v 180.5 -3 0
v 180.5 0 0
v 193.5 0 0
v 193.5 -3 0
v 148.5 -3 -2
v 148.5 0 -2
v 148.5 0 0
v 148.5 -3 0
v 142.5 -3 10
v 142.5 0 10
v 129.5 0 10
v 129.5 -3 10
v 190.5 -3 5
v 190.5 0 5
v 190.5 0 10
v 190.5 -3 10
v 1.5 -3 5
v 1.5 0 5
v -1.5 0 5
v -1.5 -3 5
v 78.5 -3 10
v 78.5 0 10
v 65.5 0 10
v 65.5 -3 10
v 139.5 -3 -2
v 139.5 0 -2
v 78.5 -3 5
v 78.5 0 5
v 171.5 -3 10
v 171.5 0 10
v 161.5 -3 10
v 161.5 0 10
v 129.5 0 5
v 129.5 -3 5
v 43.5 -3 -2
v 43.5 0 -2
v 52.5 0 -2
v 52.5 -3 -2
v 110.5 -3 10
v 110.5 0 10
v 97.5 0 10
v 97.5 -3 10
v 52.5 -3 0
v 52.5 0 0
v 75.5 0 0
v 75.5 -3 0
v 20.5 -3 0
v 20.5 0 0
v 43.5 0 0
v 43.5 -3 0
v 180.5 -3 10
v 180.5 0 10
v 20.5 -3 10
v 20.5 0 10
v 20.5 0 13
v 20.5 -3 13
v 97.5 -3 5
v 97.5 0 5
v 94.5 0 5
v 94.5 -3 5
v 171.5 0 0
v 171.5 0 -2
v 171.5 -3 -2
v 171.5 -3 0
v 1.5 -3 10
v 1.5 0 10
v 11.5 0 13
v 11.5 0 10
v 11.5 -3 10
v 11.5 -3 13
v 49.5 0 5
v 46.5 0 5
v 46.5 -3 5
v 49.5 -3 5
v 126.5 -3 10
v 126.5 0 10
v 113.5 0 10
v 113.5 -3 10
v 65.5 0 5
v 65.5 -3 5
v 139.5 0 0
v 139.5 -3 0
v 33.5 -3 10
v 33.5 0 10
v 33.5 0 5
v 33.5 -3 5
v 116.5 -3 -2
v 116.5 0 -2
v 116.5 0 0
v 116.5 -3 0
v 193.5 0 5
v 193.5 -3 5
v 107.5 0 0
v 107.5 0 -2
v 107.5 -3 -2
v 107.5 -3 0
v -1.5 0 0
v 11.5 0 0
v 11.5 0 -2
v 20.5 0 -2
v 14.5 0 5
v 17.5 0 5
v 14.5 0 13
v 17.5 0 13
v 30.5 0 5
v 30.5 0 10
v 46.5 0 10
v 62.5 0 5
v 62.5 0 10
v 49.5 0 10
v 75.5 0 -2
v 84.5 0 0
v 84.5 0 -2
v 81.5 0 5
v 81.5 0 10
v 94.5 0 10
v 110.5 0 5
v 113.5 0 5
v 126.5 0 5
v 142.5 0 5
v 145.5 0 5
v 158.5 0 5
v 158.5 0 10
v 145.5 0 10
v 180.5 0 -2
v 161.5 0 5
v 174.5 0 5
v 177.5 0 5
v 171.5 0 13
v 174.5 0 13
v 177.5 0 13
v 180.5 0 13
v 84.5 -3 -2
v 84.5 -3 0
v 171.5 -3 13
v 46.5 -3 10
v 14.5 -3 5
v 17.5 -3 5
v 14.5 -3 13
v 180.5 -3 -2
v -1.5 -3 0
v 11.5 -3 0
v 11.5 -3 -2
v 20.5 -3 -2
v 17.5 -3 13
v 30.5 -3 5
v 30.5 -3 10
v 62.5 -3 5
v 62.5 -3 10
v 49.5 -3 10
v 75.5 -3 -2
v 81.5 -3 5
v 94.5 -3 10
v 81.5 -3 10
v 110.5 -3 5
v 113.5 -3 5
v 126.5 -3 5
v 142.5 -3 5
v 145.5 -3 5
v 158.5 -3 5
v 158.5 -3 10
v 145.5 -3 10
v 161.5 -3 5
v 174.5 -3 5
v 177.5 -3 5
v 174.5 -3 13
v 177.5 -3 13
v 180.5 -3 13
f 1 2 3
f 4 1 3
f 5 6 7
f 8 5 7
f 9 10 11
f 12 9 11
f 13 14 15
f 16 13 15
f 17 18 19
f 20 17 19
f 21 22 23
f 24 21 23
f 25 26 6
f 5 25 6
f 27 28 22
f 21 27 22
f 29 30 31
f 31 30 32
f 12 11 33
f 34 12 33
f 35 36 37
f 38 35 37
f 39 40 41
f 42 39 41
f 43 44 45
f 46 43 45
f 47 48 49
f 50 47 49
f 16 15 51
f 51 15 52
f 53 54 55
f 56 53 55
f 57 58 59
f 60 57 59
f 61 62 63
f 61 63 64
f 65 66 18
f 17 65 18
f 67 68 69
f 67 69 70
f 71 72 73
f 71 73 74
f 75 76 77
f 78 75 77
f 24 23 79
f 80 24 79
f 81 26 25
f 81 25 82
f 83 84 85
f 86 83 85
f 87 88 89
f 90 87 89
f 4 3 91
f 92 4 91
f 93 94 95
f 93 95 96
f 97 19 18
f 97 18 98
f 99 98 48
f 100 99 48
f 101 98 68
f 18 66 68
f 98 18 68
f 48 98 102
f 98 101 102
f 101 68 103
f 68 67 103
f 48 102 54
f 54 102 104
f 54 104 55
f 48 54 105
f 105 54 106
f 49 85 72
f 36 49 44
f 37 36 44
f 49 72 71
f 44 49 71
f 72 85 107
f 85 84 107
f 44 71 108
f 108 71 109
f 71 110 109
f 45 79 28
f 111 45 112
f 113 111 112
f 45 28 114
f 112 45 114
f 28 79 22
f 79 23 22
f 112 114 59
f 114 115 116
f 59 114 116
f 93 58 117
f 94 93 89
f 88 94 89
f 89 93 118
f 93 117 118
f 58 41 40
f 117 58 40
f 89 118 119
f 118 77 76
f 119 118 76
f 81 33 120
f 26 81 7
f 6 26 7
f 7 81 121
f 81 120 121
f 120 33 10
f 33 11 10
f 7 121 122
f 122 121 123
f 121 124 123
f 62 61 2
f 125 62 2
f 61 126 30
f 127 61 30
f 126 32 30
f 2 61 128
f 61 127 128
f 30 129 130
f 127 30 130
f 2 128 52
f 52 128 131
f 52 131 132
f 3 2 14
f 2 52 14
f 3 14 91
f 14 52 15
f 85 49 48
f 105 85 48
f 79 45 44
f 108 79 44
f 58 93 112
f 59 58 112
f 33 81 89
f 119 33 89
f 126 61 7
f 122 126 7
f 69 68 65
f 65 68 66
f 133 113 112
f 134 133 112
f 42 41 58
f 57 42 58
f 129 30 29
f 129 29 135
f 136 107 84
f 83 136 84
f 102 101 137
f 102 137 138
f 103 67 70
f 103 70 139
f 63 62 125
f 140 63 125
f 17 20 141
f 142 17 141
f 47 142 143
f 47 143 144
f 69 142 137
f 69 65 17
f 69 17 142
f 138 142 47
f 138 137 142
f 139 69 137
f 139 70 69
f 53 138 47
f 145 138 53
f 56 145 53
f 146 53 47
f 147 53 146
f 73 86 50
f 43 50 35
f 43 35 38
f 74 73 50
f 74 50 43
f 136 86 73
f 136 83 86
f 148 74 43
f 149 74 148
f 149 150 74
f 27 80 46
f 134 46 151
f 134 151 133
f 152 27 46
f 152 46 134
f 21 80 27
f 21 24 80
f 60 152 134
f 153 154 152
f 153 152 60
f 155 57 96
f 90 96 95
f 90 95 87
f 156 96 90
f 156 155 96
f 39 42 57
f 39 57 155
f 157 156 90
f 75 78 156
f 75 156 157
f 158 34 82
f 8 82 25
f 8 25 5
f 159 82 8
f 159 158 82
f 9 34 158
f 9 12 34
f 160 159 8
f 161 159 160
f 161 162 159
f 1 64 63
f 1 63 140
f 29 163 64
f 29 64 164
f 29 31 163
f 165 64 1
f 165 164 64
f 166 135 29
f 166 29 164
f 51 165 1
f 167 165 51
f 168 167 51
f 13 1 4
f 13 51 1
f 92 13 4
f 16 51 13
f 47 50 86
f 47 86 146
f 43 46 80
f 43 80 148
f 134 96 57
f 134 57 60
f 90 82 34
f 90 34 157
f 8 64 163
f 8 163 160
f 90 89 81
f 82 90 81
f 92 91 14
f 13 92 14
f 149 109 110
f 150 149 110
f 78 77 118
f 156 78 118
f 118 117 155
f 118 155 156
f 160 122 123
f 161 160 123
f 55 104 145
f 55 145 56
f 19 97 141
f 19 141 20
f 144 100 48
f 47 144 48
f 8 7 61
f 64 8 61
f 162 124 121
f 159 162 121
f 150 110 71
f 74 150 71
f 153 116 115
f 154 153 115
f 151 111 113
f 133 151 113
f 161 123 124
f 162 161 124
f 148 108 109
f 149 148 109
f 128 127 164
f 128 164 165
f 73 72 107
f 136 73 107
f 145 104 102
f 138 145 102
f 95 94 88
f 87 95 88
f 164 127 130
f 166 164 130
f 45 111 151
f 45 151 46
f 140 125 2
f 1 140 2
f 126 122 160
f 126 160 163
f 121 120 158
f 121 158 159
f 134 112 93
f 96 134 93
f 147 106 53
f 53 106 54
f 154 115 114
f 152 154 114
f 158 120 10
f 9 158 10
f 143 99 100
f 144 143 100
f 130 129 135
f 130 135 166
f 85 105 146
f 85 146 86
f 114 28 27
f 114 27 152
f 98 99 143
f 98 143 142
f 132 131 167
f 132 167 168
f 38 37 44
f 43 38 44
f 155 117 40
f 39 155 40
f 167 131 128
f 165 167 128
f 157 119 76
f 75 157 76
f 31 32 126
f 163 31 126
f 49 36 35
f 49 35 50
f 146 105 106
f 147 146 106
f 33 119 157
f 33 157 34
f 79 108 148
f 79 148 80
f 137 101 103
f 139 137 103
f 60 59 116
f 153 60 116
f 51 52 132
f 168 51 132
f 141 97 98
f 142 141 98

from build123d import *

# Parameters (mm, degrees)
F0_W     = 1.5
F0_H     = 5
F0_W_2   = 3
F0_H_2   = 2
F0_H_3   = 3
F1_DEPTH = 3


# Not quite as in the source:
# - a feature names something its author has since deleted; it is built from what else it names


with BuildPart() as f1:
    # F0 (on Front) → F1 (new body)
    with BuildSketch(Plane.XZ):
        with Locations((0.75, 2.5)):
            Rectangle(F0_W, F0_H)
        with Locations((-0.75, 2.5)):
            Rectangle(F0_W, F0_H)
        Polygon((1.5, 5), (1.5, 0), (11.5, 0), (14.5, 0), (14.5, 5), (14.5, 10), (11.5, 10), (1.5, 10), align=None)
        with Locations((13, -1)):
            Rectangle(F0_W_2, F0_H_2)
        with Locations((16, -1)):
            Rectangle(F0_W_2, F0_H_2)
        with Locations((16, 2.5)):
            Rectangle(F0_W_2, F0_H)
        with Locations((19, -1)):
            Rectangle(F0_W_2, F0_H_2)
        Polygon((17.5, 5), (17.5, 0), (20.5, 0), (30.5, 0), (30.5, 5), (30.5, 10), (20.5, 10), (17.5, 10), align=None)
        with Locations((13, 11.5)):
            Rectangle(F0_W_2, F0_H_3)
        with Locations((19, 11.5)):
            Rectangle(F0_W_2, F0_H_3)
        with Locations((32, 2.5)):
            Rectangle(F0_W_2, F0_H)
        Polygon((33.5, 5), (33.5, 0), (43.5, 0), (46.5, 0), (46.5, 5), (46.5, 10), (33.5, 10), align=None)
        with Locations((45, -1)):
            Rectangle(F0_W_2, F0_H_2)
        with Locations((48, -1)):
            Rectangle(F0_W_2, F0_H_2)
        with Locations((48, 2.5)):
            Rectangle(F0_W_2, F0_H)
        with Locations((51, -1)):
            Rectangle(F0_W_2, F0_H_2)
        Polygon((49.5, 5), (49.5, 0), (52.5, 0), (62.5, 0), (62.5, 5), (62.5, 10), (49.5, 10), align=None)
        with Locations((64, 2.5)):
            Rectangle(F0_W_2, F0_H)
        Polygon((78.5, 10), (65.5, 10), (65.5, 5), (65.5, 0), (75.5, 0), (78.5, 0), (78.5, 5), align=None)
        with Locations((77, -1)):
            Rectangle(F0_W_2, F0_H_2)
        Polygon((94.5, 10), (81.5, 10), (81.5, 5), (81.5, 0), (84.5, 0), (94.5, 0), (94.5, 5), align=None)
        with Locations((80, 2.5)):
            Rectangle(F0_W_2, F0_H)
        with Locations((80, -1)):
            Rectangle(F0_W_2, F0_H_2)
        with Locations((83, -1)):
            Rectangle(F0_W_2, F0_H_2)
        with Locations((95.25, 2.5)):
            Rectangle(F0_W, F0_H)
        with Locations((96.75, 2.5)):
            Rectangle(F0_W, F0_H)
        Polygon((110.5, 10), (97.5, 10), (97.5, 5), (97.5, 0), (107.5, 0), (110.5, 0), (110.5, 5), align=None)
        Polygon((126.5, 10), (113.5, 10), (113.5, 5), (113.5, 0), (116.5, 0), (126.5, 0), (126.5, 5), align=None)
        with Locations((112, 2.5)):
            Rectangle(F0_W_2, F0_H)
        with Locations((109, -1)):
            Rectangle(F0_W_2, F0_H_2)
        with Locations((112, -1)):
            Rectangle(F0_W_2, F0_H_2)
        with Locations((115, -1)):
            Rectangle(F0_W_2, F0_H_2)
        Polygon((142.5, 10), (129.5, 10), (129.5, 5), (129.5, 0), (139.5, 0), (142.5, 0), (142.5, 5), align=None)
        with Locations((128, 2.5)):
            Rectangle(F0_W_2, F0_H)
        Polygon((158.5, 10), (145.5, 10), (145.5, 5), (145.5, 0), (148.5, 0), (158.5, 0), (158.5, 5), align=None)
        with Locations((144, 2.5)):
            Rectangle(F0_W_2, F0_H)
        with Locations((144, -1)):
            Rectangle(F0_W_2, F0_H_2)
        with Locations((141, -1)):
            Rectangle(F0_W_2, F0_H_2)
        with Locations((147, -1)):
            Rectangle(F0_W_2, F0_H_2)
        with Locations((160, 2.5)):
            Rectangle(F0_W_2, F0_H)
        Polygon((171.5, 10), (161.5, 10), (161.5, 5), (161.5, 0), (171.5, 0), (174.5, 0), (174.5, 5), (174.5, 10), align=None)
        with Locations((173, 11.5)):
            Rectangle(F0_W_2, F0_H_3)
        with Locations((173, -1)):
            Rectangle(F0_W_2, F0_H_2)
        Polygon((180.5, 10), (177.5, 10), (177.5, 5), (177.5, 0), (180.5, 0), (190.5, 0), (190.5, 5), (190.5, 10), align=None)
        with Locations((179, 11.5)):
            Rectangle(F0_W_2, F0_H_3)
        with Locations((176, 2.5)):
            Rectangle(F0_W_2, F0_H)
        with Locations((176, -1)):
            Rectangle(F0_W_2, F0_H_2)
        with Locations((179, -1)):
            Rectangle(F0_W_2, F0_H_2)
        with Locations((191.25, 2.5)):
            Rectangle(F0_W, F0_H)
        with Locations((192.75, 2.5)):
            Rectangle(F0_W, F0_H)
    extrude(amount=F1_DEPTH)


solid = f1.part
